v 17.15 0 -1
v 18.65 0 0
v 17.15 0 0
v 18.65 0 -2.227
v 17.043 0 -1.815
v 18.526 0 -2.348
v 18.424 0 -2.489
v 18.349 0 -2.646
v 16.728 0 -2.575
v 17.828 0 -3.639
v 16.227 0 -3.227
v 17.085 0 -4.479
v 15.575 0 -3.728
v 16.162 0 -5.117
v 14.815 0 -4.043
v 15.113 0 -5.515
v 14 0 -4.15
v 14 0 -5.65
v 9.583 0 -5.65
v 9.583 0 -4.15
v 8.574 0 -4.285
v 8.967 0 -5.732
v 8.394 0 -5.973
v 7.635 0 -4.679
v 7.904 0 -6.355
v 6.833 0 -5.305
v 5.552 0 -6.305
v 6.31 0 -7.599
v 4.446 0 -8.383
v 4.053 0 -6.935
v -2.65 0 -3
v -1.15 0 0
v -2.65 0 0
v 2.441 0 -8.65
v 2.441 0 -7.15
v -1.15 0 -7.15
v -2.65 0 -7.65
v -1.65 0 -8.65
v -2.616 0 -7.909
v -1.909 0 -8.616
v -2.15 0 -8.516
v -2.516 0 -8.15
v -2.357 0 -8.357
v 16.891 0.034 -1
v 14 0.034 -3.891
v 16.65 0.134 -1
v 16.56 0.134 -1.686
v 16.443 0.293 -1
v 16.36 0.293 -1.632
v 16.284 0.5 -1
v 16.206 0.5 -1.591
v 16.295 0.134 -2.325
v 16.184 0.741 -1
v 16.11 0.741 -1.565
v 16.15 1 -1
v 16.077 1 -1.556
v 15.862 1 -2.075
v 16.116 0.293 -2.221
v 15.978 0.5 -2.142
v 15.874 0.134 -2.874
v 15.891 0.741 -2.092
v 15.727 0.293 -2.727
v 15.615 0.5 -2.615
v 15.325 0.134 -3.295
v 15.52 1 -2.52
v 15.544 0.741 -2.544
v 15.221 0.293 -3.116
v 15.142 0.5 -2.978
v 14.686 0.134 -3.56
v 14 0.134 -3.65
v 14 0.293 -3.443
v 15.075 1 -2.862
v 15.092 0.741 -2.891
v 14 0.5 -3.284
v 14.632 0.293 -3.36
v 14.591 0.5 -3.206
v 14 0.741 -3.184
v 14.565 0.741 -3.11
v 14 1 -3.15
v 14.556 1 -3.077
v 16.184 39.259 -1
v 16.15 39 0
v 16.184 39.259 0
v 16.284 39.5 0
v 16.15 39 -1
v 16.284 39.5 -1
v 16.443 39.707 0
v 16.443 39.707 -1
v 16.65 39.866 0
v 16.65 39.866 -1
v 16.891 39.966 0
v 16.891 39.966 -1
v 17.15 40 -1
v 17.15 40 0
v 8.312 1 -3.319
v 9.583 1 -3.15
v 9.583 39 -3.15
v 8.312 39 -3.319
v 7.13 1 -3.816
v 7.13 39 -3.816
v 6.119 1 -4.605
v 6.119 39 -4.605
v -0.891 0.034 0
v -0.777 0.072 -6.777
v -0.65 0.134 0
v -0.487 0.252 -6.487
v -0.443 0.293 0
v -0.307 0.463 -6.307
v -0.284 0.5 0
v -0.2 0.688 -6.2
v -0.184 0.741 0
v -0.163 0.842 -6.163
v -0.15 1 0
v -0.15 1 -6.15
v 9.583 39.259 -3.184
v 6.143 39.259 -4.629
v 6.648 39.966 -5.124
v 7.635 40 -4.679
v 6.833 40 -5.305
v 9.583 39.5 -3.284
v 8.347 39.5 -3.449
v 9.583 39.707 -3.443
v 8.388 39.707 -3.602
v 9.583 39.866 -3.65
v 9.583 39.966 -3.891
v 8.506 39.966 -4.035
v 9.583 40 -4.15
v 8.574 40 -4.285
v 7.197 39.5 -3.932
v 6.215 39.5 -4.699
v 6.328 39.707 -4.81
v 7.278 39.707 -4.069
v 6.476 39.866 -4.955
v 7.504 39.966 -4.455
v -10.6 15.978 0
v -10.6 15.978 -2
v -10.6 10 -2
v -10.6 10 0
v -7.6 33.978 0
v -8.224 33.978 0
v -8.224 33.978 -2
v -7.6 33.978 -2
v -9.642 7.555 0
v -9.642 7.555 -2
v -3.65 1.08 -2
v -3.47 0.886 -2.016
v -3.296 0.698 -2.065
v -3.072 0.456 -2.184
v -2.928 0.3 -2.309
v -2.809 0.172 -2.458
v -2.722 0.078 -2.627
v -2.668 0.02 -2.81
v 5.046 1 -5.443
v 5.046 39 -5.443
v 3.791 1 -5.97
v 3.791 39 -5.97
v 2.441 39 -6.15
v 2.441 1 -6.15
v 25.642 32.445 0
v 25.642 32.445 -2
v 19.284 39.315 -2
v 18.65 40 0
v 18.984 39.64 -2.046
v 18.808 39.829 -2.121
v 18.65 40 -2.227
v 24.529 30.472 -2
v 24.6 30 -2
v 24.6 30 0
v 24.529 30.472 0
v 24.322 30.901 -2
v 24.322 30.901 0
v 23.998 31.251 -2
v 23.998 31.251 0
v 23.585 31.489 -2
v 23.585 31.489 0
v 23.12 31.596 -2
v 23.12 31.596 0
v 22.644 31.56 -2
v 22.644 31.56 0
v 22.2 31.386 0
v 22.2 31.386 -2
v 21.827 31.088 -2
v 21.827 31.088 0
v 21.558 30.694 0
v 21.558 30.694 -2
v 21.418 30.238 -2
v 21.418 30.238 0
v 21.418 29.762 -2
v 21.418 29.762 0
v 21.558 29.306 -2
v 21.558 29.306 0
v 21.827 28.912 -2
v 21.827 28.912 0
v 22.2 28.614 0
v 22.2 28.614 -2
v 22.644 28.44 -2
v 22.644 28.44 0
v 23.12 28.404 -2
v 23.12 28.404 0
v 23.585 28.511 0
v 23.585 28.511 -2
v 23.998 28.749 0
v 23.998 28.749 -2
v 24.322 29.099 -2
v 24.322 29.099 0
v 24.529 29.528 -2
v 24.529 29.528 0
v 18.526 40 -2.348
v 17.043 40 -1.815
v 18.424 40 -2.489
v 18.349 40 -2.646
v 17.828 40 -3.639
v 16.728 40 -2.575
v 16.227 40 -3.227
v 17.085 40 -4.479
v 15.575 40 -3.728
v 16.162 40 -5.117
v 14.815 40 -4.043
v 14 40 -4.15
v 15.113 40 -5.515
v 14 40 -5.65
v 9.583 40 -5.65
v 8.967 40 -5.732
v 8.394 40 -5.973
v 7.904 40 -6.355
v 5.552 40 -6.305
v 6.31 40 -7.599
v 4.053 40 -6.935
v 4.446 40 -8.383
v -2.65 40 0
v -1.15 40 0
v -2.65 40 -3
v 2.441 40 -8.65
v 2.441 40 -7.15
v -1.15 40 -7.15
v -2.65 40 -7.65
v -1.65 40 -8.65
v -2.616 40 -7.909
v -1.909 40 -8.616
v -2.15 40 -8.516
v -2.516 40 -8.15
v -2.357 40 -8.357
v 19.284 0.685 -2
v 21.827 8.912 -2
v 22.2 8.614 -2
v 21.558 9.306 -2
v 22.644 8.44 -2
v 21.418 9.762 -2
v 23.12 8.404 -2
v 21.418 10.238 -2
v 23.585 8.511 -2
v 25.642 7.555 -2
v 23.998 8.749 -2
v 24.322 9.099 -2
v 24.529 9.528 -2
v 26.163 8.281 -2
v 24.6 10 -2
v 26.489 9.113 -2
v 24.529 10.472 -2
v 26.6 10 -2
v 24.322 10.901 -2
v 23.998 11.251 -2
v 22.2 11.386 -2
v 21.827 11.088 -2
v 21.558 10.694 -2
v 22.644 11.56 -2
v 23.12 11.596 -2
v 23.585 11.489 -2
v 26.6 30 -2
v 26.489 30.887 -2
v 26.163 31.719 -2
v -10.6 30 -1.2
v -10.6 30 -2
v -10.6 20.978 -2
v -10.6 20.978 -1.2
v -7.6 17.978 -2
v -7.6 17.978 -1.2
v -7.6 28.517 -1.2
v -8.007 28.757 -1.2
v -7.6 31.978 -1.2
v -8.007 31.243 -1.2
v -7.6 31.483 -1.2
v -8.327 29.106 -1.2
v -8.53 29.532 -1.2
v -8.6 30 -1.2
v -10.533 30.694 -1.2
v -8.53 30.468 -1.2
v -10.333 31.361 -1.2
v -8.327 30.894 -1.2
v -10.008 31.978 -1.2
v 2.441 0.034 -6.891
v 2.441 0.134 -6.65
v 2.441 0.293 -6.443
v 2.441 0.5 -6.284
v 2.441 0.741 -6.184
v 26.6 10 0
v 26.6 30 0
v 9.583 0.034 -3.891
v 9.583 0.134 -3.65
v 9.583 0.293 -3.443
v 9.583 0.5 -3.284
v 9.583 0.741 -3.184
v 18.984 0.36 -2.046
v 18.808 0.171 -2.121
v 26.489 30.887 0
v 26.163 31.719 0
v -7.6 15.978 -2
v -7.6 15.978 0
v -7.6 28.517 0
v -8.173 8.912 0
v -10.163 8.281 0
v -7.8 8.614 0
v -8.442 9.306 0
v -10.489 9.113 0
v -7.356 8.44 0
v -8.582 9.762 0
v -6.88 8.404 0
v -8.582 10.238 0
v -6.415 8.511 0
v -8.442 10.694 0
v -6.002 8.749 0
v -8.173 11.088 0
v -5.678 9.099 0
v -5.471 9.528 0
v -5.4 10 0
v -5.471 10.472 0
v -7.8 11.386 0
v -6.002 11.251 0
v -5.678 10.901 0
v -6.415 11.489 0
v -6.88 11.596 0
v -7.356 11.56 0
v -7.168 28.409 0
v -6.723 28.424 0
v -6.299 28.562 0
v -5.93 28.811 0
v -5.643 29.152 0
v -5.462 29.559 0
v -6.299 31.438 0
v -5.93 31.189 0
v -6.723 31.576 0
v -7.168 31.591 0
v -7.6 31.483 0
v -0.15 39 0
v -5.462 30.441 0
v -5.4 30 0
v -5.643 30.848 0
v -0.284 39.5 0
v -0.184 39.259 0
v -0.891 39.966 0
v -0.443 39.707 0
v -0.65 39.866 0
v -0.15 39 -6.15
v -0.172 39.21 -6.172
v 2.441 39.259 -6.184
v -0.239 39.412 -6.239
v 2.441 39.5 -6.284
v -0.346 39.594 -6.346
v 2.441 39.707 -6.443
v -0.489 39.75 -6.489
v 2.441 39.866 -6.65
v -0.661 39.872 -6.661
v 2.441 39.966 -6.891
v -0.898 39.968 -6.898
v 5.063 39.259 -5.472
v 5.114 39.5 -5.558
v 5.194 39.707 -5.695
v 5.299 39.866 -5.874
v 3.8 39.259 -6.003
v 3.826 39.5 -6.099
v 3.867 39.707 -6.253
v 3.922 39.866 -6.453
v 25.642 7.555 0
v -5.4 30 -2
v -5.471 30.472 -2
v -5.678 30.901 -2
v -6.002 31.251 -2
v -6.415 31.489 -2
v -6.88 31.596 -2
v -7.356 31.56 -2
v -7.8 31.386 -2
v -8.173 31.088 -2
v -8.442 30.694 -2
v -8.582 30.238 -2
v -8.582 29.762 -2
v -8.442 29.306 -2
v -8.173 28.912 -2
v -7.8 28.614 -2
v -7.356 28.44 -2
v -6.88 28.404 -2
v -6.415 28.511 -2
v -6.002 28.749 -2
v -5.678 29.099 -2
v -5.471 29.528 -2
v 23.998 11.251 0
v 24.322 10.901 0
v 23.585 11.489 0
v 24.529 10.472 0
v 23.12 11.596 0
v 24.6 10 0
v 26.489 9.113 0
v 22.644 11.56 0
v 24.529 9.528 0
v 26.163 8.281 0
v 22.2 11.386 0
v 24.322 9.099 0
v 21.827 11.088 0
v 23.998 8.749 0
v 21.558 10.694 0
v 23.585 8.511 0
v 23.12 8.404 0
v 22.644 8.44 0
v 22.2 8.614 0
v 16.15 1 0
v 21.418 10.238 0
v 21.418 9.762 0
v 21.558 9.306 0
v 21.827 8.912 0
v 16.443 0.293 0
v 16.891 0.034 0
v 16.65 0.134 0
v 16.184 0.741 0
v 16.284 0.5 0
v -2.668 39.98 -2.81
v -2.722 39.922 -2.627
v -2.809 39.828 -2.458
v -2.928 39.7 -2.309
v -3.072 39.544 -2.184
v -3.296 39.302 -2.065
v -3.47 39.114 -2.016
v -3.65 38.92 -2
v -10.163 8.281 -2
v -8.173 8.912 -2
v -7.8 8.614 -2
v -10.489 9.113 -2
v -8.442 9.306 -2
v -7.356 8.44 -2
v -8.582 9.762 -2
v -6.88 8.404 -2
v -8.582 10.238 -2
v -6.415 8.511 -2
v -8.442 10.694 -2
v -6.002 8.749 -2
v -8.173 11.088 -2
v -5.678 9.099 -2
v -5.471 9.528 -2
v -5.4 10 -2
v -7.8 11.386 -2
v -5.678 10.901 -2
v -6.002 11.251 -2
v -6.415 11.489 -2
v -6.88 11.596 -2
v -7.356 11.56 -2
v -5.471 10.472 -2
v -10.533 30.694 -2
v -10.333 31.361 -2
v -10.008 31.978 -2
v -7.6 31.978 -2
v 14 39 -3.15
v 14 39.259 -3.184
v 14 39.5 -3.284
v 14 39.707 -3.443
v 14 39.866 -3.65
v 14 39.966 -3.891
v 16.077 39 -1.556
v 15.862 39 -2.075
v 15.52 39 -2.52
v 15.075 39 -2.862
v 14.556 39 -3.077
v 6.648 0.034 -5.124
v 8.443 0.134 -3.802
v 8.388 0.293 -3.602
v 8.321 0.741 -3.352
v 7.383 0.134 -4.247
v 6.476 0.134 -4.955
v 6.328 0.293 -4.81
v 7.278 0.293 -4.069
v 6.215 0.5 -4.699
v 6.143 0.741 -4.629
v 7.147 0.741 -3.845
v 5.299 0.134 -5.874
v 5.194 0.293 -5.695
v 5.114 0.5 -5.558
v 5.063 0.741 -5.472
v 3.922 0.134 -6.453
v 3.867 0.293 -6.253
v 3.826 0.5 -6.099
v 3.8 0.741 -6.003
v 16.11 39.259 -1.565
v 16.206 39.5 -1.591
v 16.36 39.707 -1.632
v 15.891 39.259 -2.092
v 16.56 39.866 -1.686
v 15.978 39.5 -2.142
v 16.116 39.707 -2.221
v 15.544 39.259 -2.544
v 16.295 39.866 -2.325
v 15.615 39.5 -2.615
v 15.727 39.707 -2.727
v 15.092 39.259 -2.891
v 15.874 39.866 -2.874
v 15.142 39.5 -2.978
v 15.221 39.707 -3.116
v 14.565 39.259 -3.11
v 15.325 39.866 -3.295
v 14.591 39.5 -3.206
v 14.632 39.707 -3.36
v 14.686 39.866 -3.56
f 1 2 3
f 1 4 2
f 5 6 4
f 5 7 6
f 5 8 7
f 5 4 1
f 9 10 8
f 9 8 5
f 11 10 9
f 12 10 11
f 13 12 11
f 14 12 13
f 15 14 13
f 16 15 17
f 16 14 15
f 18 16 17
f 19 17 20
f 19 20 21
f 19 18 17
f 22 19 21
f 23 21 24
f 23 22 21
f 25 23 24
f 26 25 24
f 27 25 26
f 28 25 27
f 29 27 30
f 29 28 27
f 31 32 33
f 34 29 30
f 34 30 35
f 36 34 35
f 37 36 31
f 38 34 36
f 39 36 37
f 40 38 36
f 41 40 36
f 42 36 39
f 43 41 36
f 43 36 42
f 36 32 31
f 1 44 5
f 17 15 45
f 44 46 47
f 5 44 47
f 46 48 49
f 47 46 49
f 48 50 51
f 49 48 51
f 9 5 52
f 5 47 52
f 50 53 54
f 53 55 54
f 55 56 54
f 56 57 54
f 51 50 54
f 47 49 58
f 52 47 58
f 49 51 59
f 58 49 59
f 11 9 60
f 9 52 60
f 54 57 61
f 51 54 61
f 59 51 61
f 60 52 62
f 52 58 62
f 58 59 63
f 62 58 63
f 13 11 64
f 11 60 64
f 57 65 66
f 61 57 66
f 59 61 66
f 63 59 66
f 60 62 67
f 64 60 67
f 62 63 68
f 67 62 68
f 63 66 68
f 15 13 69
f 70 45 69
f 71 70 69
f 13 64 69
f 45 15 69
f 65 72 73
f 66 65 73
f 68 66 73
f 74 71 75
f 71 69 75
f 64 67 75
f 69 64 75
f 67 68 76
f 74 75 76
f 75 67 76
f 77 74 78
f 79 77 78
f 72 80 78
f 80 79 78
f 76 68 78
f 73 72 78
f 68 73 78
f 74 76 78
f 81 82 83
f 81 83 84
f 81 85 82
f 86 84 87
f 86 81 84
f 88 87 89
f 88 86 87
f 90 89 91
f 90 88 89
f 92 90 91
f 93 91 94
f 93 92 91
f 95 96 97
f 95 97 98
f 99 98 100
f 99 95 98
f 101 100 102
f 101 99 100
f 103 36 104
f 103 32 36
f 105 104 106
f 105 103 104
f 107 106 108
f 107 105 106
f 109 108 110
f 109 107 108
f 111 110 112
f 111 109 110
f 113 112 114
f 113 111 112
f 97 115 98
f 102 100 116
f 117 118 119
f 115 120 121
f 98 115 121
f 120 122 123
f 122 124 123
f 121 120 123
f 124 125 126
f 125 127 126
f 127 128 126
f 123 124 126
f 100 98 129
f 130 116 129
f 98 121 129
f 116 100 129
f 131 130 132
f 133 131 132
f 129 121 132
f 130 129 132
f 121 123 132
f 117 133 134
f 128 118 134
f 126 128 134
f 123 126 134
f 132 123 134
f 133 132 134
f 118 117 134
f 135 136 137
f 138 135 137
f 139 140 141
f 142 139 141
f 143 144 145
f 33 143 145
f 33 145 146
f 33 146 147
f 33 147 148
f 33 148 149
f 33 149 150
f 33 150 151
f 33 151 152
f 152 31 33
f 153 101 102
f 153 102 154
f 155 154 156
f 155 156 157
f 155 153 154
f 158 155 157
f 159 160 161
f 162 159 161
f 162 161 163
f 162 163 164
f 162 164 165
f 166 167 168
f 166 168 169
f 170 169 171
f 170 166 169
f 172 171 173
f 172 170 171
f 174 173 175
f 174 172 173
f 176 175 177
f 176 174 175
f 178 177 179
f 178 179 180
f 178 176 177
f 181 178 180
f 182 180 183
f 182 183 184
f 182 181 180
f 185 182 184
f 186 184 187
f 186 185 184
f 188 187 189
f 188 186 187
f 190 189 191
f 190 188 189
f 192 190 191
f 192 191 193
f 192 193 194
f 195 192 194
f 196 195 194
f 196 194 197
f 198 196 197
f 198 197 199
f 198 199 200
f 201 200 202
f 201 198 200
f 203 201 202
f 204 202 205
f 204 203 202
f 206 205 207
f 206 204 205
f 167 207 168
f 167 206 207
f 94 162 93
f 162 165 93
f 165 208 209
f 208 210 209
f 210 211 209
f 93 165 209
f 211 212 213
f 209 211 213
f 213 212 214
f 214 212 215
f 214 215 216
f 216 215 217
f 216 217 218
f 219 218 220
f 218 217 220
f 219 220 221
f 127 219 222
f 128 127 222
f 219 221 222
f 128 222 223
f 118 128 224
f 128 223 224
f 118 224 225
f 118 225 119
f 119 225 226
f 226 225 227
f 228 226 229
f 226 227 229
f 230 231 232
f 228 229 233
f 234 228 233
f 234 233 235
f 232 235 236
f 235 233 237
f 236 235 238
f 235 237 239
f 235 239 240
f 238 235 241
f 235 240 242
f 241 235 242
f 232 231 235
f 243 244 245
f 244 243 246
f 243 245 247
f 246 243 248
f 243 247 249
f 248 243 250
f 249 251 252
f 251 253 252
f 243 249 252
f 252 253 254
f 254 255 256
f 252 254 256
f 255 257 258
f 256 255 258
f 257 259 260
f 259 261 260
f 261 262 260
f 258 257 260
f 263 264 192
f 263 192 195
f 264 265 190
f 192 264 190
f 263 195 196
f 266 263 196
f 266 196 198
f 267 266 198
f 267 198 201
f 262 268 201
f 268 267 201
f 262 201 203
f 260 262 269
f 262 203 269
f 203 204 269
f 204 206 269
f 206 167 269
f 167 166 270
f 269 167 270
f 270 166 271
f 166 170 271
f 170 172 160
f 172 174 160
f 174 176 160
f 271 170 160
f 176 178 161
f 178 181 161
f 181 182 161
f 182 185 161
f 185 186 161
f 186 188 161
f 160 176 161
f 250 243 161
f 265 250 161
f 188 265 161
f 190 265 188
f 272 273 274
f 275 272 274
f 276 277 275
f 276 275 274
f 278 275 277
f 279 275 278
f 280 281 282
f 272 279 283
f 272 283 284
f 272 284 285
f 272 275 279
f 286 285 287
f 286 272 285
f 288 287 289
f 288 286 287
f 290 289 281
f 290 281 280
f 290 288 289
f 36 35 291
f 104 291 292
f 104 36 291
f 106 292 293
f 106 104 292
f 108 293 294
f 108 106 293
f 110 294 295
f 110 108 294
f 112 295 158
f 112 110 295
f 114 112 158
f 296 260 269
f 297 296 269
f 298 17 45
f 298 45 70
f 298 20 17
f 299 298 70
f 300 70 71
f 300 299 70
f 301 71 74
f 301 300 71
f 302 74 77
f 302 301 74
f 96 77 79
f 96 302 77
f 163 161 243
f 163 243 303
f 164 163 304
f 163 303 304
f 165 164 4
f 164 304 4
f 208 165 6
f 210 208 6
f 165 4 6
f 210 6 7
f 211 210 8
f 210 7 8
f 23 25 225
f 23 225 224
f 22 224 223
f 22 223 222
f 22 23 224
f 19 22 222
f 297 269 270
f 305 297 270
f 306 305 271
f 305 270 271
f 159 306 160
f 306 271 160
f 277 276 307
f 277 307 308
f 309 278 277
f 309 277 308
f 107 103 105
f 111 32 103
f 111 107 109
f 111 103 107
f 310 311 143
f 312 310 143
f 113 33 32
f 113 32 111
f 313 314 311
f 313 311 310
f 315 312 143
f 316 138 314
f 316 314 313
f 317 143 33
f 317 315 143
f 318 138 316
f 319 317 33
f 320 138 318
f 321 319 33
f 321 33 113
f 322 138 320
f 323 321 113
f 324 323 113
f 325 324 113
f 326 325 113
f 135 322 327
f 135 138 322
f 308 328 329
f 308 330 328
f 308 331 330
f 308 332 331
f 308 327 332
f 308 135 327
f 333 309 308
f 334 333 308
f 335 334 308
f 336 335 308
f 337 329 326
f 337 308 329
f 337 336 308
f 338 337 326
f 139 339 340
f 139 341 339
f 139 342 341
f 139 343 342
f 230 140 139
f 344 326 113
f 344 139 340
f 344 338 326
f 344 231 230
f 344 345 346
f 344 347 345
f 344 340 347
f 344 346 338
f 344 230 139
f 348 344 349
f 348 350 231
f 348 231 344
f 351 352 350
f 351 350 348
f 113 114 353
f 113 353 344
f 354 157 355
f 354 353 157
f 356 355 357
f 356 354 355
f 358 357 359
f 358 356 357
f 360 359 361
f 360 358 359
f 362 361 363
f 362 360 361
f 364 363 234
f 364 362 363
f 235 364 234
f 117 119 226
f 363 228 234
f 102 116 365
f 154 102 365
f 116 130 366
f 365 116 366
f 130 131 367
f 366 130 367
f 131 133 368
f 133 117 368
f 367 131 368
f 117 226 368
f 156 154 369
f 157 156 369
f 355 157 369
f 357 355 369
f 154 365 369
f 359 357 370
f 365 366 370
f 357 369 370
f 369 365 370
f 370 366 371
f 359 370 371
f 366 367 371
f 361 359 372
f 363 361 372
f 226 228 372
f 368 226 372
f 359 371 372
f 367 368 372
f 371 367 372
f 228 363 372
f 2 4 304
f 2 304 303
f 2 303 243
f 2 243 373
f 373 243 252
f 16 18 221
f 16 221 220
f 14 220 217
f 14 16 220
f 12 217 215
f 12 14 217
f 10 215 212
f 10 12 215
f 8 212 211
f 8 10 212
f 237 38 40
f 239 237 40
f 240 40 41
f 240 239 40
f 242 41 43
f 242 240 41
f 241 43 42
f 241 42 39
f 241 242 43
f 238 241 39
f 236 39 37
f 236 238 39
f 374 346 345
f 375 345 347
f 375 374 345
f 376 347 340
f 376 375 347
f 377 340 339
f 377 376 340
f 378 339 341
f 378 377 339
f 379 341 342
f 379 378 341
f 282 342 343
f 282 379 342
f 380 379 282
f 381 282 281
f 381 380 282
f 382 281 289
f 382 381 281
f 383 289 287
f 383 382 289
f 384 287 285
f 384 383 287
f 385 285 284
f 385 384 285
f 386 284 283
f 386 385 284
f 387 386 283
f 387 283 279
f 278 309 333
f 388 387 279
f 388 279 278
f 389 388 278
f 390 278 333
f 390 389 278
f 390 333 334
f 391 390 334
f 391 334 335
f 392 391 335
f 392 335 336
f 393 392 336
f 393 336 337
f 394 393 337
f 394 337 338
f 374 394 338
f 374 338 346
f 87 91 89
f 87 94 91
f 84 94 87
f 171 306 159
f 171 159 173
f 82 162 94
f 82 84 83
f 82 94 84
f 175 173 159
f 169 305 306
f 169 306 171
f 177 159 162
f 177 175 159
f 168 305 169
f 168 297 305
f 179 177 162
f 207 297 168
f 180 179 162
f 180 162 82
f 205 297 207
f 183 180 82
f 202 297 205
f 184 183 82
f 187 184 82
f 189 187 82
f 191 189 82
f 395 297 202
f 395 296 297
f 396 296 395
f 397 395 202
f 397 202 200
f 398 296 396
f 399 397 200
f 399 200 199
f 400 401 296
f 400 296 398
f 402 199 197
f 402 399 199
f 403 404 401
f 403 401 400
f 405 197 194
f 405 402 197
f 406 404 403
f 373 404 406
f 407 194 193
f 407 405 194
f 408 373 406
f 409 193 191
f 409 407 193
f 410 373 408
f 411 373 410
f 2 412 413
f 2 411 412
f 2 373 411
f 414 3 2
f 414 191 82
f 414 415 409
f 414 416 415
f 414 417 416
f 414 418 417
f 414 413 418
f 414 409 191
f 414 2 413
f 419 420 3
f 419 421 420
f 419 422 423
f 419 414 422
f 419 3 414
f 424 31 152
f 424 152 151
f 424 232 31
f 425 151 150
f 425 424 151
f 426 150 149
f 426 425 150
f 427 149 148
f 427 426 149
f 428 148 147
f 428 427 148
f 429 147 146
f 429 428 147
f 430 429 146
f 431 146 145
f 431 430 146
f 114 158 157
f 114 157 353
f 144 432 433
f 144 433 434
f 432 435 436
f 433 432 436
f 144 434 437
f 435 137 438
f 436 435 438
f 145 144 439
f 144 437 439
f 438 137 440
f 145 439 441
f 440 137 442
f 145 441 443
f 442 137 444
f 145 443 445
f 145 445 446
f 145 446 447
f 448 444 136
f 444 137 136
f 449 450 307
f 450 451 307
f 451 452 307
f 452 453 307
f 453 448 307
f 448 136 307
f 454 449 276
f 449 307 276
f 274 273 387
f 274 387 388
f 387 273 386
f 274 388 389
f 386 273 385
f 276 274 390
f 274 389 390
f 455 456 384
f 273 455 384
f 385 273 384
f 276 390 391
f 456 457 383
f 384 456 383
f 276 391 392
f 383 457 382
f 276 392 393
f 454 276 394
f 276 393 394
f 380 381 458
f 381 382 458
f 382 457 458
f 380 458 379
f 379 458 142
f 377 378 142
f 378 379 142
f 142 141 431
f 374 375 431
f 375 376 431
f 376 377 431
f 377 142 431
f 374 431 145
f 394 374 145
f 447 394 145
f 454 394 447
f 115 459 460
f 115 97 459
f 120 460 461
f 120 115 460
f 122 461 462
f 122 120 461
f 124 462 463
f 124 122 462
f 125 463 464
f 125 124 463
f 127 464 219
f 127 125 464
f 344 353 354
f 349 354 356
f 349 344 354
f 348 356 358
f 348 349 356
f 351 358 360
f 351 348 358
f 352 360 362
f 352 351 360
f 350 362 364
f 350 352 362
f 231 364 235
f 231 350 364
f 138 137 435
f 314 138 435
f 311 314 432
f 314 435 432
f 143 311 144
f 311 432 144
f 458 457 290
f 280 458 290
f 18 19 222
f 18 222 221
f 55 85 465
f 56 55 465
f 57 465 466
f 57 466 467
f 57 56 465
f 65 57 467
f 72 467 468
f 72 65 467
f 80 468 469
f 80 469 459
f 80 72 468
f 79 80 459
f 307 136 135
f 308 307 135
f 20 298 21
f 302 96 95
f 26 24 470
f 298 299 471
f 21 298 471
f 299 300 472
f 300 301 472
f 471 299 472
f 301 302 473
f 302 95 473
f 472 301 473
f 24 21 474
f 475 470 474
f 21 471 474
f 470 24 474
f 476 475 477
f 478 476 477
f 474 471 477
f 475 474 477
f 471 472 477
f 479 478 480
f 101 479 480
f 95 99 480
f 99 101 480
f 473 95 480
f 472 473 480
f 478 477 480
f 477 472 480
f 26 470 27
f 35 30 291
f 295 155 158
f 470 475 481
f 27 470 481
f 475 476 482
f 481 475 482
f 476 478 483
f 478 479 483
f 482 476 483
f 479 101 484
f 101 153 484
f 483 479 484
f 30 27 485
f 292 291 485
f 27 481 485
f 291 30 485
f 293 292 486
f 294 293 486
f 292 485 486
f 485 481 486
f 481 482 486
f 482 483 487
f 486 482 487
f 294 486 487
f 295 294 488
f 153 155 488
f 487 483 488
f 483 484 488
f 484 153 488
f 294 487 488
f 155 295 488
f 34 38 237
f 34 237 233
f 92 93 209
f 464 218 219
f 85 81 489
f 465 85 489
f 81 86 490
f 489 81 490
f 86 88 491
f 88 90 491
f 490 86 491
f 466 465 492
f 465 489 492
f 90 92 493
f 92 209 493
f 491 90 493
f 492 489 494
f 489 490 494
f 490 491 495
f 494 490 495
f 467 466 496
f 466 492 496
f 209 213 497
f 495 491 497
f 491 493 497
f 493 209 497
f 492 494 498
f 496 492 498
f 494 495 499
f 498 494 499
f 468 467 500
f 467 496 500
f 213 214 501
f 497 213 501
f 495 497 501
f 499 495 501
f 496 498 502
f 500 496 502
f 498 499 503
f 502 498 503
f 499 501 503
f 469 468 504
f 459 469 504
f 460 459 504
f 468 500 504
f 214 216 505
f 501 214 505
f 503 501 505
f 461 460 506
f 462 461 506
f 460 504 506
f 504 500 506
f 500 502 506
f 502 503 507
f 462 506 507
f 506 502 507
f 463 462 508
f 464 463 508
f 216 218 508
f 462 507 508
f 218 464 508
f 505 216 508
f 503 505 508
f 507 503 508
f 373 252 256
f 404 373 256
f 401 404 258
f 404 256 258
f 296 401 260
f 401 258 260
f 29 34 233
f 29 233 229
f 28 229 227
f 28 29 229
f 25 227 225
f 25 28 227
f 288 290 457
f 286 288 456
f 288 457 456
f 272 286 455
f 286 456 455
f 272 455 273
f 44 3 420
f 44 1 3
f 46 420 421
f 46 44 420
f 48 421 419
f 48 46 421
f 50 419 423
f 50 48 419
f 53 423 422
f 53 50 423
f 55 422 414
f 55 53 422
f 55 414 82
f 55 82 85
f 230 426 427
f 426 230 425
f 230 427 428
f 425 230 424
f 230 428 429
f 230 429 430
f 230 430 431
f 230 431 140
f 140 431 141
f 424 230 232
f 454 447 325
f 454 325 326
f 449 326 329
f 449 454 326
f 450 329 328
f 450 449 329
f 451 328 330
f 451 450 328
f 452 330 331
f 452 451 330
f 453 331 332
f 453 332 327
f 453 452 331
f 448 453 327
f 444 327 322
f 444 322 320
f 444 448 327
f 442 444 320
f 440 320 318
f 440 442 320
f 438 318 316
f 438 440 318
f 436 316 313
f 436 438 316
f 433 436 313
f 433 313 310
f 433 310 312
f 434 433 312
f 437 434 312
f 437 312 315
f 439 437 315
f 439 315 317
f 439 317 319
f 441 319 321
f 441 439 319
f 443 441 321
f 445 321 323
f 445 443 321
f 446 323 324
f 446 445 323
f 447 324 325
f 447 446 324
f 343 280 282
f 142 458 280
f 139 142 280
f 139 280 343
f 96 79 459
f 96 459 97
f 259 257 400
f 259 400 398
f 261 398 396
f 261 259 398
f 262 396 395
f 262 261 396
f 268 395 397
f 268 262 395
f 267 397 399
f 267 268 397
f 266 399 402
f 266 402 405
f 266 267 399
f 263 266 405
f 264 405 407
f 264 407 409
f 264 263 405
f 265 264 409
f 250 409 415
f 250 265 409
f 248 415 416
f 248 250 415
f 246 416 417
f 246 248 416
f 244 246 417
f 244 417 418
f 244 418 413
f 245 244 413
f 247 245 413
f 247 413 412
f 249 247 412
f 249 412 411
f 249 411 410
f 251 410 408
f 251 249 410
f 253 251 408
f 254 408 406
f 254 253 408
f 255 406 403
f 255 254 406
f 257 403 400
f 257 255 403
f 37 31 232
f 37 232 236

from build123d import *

# Parameters (mm, degrees)
BOSS_EXTRUDE1_DEPTH     = 40
BOSS_EXTRUDE2_START     = -2
BOSS_EXTRUDE2_OUTLINE_R = 1.6
BOSS_EXTRUDE2_DEPTH     = 2
FILLET1_R               = 1
FILLET2_R               = 1
SKETCH3_W               = 1.2
SKETCH3_H               = 2
SKETCH3_W_2             = 23.413110463
SKETCH3_H_2             = 14
CUT_EXTRUDE1_DEPTH      = 3
CHAMFER1_SIZE           = 3


# Read off the part's stored shape, not the designer's step: Boss-Extrude2
with BuildPart() as part:
    # Sketch1 → Boss-Extrude1 (new body)
    with BuildSketch(Plane(origin=(0, 0, 0), x_dir=(1, 0, 0), z_dir=(0, 1, 0))):
        with BuildLine():
            ThreePointArc((7.904340014, 6.355), (8.672424609, 5.833407053), (9.582575695, 5.65))
            Line((9.582575695, 5.65), (14, 5.65))
            ThreePointArc((14, 5.65), (17.288046533, 4.288046533), (18.65, 1))
            Line((18.65, 1), (18.65, 0))
            Line((18.65, 0), (16.15, 0))
            Line((16.15, 0), (16.15, 1))
            ThreePointArc((16.15, 1), (15.52027958, 2.52027958), (14, 3.15))
            Line((14, 3.15), (9.582575695, 3.15))
            ThreePointArc((9.582575695, 3.15), (7.704178772, 3.528520938), (6.118982907, 4.605))
            ThreePointArc((6.118982907, 4.605), (4.43573369, 5.748065396), (2.441147266, 6.15))
            Line((2.441147266, 6.15), (-0.15, 6.15))
            Line((-0.15, 6.15), (-0.15, 0))
            Line((-0.15, 0), (-2.65, 0))
            Line((-2.65, 0), (-2.65, 8.65))
            Line((-2.65, 8.65), (2.441147266, 8.65))
            ThreePointArc((2.441147266, 8.65), (5.403979526, 8.05295151), (7.904340014, 6.355))
        make_face()
    extrude(amount=BOSS_EXTRUDE1_DEPTH)

    # Boss-Extrude2 outline → Boss-Extrude2 (add)
    # profile 1 of 2: a face of its own
    with BuildSketch(Plane.XY.offset(BOSS_EXTRUDE2_START)):
        with BuildLine():
            Line((-2.65, 40), (-9.642066198, 32.445298796))
            ThreePointArc((-9.642066198, 32.445298796), (-10.351972428, 31.313118747), (-10.6, 30))
            Line((-10.6, 30), (-10.6, 10))
            ThreePointArc((-10.6, 10), (-10.351972428, 8.686881253), (-9.642066198, 7.554701204))
            Line((-9.642066198, 7.554701204), (-2.65, 0))
            Line((-2.65, 0), (-2.65, 40))
        make_face()
        with Locations((-7, 10)):
            Circle(BOSS_EXTRUDE2_OUTLINE_R, mode=Mode.SUBTRACT)
        with Locations((-7, 30)):
            Circle(BOSS_EXTRUDE2_OUTLINE_R, mode=Mode.SUBTRACT)
    # profile 2 of 2: a face of its own
    with BuildSketch(Plane.XY.offset(BOSS_EXTRUDE2_START)):
        with BuildLine():
            Line((26.6, 10), (26.6, 30))
            ThreePointArc((26.6, 30), (26.351972428, 31.313118747), (25.642066198, 32.445298796))
            Line((25.642066198, 32.445298796), (18.65, 40))
            Line((18.65, 40), (16.15, 40))
            Line((16.15, 40), (16.15, 0))
            Line((16.15, 0), (18.65, 0))
            Line((18.65, 0), (25.642066198, 7.554701204))
            ThreePointArc((25.642066198, 7.554701204), (26.351972428, 8.686881253), (26.6, 10))
        make_face()
        with Locations((23, 30)):
            Circle(BOSS_EXTRUDE2_OUTLINE_R, mode=Mode.SUBTRACT)
        with Locations((23, 10)):
            Circle(BOSS_EXTRUDE2_OUTLINE_R, mode=Mode.SUBTRACT)
    extrude(amount=BOSS_EXTRUDE2_DEPTH)

    # Fillet1
    fillet1_edges = [part.edges().sort_by_distance(p)[0] for p in [
        (-2.65, 20, -2),
        (-2.65, 20, -8.65),
        (18.541200282, 20, -2),
    ]]
    fillet(fillet1_edges, radius=FILLET1_R)

    # Fillet2
    fillet2_edges = [part.edges().sort_by_distance(p)[0] for p in [
        (16.15, 0, -0.5),
        (15.52027958, 0, -2.52027958),
        (11.791287847, 0, -3.15),
        (7.704178772, 0, -3.528520938),
        (4.43573369, 0, -5.748065396),
        (1.145573633, 0, -6.15),
        (-0.15, 0, -3.075),
        (-0.15, 40, -3.075),
        (1.145573633, 40, -6.15),
        (4.43573369, 40, -5.748065396),
        (7.704178772, 40, -3.528520938),
        (11.791287847, 40, -3.15),
        (15.52027958, 40, -2.52027958),
        (16.15, 40, -0.5),
    ]]
    fillet(fillet2_edges, radius=FILLET2_R)

    # Sketch3 → Cut-Extrude1 (cut)
    with BuildSketch(Plane.ZY.offset(10.6)):
        with Locations((-0.6, 32.977751257)):
            Rectangle(SKETCH3_W, SKETCH3_H)
        with Locations((-12.906555232, 32.977751257)):
            Rectangle(SKETCH3_W_2, SKETCH3_H)
        with Locations((-0.6, 24.977751257)):
            Rectangle(SKETCH3_W, SKETCH3_H_2)
        Polygon((0, 15.977751257), (0, 17.977751257), (-1.2, 17.977751257), (-15.374287906, 17.977751257), (-15.374287906, 15.977751257), align=None)
    extrude(amount=-CUT_EXTRUDE1_DEPTH, mode=Mode.SUBTRACT)

    # Chamfer1
    chamfer1_edges = [part.edges().sort_by_distance(p)[0] for p in [
        (-10.6, 17.977751257, -1.6),
    ]]
    chamfer(chamfer1_edges, length=CHAMFER1_SIZE - 0.0001)  # a hair under: the kernel refuses the full size


solid = part.part
